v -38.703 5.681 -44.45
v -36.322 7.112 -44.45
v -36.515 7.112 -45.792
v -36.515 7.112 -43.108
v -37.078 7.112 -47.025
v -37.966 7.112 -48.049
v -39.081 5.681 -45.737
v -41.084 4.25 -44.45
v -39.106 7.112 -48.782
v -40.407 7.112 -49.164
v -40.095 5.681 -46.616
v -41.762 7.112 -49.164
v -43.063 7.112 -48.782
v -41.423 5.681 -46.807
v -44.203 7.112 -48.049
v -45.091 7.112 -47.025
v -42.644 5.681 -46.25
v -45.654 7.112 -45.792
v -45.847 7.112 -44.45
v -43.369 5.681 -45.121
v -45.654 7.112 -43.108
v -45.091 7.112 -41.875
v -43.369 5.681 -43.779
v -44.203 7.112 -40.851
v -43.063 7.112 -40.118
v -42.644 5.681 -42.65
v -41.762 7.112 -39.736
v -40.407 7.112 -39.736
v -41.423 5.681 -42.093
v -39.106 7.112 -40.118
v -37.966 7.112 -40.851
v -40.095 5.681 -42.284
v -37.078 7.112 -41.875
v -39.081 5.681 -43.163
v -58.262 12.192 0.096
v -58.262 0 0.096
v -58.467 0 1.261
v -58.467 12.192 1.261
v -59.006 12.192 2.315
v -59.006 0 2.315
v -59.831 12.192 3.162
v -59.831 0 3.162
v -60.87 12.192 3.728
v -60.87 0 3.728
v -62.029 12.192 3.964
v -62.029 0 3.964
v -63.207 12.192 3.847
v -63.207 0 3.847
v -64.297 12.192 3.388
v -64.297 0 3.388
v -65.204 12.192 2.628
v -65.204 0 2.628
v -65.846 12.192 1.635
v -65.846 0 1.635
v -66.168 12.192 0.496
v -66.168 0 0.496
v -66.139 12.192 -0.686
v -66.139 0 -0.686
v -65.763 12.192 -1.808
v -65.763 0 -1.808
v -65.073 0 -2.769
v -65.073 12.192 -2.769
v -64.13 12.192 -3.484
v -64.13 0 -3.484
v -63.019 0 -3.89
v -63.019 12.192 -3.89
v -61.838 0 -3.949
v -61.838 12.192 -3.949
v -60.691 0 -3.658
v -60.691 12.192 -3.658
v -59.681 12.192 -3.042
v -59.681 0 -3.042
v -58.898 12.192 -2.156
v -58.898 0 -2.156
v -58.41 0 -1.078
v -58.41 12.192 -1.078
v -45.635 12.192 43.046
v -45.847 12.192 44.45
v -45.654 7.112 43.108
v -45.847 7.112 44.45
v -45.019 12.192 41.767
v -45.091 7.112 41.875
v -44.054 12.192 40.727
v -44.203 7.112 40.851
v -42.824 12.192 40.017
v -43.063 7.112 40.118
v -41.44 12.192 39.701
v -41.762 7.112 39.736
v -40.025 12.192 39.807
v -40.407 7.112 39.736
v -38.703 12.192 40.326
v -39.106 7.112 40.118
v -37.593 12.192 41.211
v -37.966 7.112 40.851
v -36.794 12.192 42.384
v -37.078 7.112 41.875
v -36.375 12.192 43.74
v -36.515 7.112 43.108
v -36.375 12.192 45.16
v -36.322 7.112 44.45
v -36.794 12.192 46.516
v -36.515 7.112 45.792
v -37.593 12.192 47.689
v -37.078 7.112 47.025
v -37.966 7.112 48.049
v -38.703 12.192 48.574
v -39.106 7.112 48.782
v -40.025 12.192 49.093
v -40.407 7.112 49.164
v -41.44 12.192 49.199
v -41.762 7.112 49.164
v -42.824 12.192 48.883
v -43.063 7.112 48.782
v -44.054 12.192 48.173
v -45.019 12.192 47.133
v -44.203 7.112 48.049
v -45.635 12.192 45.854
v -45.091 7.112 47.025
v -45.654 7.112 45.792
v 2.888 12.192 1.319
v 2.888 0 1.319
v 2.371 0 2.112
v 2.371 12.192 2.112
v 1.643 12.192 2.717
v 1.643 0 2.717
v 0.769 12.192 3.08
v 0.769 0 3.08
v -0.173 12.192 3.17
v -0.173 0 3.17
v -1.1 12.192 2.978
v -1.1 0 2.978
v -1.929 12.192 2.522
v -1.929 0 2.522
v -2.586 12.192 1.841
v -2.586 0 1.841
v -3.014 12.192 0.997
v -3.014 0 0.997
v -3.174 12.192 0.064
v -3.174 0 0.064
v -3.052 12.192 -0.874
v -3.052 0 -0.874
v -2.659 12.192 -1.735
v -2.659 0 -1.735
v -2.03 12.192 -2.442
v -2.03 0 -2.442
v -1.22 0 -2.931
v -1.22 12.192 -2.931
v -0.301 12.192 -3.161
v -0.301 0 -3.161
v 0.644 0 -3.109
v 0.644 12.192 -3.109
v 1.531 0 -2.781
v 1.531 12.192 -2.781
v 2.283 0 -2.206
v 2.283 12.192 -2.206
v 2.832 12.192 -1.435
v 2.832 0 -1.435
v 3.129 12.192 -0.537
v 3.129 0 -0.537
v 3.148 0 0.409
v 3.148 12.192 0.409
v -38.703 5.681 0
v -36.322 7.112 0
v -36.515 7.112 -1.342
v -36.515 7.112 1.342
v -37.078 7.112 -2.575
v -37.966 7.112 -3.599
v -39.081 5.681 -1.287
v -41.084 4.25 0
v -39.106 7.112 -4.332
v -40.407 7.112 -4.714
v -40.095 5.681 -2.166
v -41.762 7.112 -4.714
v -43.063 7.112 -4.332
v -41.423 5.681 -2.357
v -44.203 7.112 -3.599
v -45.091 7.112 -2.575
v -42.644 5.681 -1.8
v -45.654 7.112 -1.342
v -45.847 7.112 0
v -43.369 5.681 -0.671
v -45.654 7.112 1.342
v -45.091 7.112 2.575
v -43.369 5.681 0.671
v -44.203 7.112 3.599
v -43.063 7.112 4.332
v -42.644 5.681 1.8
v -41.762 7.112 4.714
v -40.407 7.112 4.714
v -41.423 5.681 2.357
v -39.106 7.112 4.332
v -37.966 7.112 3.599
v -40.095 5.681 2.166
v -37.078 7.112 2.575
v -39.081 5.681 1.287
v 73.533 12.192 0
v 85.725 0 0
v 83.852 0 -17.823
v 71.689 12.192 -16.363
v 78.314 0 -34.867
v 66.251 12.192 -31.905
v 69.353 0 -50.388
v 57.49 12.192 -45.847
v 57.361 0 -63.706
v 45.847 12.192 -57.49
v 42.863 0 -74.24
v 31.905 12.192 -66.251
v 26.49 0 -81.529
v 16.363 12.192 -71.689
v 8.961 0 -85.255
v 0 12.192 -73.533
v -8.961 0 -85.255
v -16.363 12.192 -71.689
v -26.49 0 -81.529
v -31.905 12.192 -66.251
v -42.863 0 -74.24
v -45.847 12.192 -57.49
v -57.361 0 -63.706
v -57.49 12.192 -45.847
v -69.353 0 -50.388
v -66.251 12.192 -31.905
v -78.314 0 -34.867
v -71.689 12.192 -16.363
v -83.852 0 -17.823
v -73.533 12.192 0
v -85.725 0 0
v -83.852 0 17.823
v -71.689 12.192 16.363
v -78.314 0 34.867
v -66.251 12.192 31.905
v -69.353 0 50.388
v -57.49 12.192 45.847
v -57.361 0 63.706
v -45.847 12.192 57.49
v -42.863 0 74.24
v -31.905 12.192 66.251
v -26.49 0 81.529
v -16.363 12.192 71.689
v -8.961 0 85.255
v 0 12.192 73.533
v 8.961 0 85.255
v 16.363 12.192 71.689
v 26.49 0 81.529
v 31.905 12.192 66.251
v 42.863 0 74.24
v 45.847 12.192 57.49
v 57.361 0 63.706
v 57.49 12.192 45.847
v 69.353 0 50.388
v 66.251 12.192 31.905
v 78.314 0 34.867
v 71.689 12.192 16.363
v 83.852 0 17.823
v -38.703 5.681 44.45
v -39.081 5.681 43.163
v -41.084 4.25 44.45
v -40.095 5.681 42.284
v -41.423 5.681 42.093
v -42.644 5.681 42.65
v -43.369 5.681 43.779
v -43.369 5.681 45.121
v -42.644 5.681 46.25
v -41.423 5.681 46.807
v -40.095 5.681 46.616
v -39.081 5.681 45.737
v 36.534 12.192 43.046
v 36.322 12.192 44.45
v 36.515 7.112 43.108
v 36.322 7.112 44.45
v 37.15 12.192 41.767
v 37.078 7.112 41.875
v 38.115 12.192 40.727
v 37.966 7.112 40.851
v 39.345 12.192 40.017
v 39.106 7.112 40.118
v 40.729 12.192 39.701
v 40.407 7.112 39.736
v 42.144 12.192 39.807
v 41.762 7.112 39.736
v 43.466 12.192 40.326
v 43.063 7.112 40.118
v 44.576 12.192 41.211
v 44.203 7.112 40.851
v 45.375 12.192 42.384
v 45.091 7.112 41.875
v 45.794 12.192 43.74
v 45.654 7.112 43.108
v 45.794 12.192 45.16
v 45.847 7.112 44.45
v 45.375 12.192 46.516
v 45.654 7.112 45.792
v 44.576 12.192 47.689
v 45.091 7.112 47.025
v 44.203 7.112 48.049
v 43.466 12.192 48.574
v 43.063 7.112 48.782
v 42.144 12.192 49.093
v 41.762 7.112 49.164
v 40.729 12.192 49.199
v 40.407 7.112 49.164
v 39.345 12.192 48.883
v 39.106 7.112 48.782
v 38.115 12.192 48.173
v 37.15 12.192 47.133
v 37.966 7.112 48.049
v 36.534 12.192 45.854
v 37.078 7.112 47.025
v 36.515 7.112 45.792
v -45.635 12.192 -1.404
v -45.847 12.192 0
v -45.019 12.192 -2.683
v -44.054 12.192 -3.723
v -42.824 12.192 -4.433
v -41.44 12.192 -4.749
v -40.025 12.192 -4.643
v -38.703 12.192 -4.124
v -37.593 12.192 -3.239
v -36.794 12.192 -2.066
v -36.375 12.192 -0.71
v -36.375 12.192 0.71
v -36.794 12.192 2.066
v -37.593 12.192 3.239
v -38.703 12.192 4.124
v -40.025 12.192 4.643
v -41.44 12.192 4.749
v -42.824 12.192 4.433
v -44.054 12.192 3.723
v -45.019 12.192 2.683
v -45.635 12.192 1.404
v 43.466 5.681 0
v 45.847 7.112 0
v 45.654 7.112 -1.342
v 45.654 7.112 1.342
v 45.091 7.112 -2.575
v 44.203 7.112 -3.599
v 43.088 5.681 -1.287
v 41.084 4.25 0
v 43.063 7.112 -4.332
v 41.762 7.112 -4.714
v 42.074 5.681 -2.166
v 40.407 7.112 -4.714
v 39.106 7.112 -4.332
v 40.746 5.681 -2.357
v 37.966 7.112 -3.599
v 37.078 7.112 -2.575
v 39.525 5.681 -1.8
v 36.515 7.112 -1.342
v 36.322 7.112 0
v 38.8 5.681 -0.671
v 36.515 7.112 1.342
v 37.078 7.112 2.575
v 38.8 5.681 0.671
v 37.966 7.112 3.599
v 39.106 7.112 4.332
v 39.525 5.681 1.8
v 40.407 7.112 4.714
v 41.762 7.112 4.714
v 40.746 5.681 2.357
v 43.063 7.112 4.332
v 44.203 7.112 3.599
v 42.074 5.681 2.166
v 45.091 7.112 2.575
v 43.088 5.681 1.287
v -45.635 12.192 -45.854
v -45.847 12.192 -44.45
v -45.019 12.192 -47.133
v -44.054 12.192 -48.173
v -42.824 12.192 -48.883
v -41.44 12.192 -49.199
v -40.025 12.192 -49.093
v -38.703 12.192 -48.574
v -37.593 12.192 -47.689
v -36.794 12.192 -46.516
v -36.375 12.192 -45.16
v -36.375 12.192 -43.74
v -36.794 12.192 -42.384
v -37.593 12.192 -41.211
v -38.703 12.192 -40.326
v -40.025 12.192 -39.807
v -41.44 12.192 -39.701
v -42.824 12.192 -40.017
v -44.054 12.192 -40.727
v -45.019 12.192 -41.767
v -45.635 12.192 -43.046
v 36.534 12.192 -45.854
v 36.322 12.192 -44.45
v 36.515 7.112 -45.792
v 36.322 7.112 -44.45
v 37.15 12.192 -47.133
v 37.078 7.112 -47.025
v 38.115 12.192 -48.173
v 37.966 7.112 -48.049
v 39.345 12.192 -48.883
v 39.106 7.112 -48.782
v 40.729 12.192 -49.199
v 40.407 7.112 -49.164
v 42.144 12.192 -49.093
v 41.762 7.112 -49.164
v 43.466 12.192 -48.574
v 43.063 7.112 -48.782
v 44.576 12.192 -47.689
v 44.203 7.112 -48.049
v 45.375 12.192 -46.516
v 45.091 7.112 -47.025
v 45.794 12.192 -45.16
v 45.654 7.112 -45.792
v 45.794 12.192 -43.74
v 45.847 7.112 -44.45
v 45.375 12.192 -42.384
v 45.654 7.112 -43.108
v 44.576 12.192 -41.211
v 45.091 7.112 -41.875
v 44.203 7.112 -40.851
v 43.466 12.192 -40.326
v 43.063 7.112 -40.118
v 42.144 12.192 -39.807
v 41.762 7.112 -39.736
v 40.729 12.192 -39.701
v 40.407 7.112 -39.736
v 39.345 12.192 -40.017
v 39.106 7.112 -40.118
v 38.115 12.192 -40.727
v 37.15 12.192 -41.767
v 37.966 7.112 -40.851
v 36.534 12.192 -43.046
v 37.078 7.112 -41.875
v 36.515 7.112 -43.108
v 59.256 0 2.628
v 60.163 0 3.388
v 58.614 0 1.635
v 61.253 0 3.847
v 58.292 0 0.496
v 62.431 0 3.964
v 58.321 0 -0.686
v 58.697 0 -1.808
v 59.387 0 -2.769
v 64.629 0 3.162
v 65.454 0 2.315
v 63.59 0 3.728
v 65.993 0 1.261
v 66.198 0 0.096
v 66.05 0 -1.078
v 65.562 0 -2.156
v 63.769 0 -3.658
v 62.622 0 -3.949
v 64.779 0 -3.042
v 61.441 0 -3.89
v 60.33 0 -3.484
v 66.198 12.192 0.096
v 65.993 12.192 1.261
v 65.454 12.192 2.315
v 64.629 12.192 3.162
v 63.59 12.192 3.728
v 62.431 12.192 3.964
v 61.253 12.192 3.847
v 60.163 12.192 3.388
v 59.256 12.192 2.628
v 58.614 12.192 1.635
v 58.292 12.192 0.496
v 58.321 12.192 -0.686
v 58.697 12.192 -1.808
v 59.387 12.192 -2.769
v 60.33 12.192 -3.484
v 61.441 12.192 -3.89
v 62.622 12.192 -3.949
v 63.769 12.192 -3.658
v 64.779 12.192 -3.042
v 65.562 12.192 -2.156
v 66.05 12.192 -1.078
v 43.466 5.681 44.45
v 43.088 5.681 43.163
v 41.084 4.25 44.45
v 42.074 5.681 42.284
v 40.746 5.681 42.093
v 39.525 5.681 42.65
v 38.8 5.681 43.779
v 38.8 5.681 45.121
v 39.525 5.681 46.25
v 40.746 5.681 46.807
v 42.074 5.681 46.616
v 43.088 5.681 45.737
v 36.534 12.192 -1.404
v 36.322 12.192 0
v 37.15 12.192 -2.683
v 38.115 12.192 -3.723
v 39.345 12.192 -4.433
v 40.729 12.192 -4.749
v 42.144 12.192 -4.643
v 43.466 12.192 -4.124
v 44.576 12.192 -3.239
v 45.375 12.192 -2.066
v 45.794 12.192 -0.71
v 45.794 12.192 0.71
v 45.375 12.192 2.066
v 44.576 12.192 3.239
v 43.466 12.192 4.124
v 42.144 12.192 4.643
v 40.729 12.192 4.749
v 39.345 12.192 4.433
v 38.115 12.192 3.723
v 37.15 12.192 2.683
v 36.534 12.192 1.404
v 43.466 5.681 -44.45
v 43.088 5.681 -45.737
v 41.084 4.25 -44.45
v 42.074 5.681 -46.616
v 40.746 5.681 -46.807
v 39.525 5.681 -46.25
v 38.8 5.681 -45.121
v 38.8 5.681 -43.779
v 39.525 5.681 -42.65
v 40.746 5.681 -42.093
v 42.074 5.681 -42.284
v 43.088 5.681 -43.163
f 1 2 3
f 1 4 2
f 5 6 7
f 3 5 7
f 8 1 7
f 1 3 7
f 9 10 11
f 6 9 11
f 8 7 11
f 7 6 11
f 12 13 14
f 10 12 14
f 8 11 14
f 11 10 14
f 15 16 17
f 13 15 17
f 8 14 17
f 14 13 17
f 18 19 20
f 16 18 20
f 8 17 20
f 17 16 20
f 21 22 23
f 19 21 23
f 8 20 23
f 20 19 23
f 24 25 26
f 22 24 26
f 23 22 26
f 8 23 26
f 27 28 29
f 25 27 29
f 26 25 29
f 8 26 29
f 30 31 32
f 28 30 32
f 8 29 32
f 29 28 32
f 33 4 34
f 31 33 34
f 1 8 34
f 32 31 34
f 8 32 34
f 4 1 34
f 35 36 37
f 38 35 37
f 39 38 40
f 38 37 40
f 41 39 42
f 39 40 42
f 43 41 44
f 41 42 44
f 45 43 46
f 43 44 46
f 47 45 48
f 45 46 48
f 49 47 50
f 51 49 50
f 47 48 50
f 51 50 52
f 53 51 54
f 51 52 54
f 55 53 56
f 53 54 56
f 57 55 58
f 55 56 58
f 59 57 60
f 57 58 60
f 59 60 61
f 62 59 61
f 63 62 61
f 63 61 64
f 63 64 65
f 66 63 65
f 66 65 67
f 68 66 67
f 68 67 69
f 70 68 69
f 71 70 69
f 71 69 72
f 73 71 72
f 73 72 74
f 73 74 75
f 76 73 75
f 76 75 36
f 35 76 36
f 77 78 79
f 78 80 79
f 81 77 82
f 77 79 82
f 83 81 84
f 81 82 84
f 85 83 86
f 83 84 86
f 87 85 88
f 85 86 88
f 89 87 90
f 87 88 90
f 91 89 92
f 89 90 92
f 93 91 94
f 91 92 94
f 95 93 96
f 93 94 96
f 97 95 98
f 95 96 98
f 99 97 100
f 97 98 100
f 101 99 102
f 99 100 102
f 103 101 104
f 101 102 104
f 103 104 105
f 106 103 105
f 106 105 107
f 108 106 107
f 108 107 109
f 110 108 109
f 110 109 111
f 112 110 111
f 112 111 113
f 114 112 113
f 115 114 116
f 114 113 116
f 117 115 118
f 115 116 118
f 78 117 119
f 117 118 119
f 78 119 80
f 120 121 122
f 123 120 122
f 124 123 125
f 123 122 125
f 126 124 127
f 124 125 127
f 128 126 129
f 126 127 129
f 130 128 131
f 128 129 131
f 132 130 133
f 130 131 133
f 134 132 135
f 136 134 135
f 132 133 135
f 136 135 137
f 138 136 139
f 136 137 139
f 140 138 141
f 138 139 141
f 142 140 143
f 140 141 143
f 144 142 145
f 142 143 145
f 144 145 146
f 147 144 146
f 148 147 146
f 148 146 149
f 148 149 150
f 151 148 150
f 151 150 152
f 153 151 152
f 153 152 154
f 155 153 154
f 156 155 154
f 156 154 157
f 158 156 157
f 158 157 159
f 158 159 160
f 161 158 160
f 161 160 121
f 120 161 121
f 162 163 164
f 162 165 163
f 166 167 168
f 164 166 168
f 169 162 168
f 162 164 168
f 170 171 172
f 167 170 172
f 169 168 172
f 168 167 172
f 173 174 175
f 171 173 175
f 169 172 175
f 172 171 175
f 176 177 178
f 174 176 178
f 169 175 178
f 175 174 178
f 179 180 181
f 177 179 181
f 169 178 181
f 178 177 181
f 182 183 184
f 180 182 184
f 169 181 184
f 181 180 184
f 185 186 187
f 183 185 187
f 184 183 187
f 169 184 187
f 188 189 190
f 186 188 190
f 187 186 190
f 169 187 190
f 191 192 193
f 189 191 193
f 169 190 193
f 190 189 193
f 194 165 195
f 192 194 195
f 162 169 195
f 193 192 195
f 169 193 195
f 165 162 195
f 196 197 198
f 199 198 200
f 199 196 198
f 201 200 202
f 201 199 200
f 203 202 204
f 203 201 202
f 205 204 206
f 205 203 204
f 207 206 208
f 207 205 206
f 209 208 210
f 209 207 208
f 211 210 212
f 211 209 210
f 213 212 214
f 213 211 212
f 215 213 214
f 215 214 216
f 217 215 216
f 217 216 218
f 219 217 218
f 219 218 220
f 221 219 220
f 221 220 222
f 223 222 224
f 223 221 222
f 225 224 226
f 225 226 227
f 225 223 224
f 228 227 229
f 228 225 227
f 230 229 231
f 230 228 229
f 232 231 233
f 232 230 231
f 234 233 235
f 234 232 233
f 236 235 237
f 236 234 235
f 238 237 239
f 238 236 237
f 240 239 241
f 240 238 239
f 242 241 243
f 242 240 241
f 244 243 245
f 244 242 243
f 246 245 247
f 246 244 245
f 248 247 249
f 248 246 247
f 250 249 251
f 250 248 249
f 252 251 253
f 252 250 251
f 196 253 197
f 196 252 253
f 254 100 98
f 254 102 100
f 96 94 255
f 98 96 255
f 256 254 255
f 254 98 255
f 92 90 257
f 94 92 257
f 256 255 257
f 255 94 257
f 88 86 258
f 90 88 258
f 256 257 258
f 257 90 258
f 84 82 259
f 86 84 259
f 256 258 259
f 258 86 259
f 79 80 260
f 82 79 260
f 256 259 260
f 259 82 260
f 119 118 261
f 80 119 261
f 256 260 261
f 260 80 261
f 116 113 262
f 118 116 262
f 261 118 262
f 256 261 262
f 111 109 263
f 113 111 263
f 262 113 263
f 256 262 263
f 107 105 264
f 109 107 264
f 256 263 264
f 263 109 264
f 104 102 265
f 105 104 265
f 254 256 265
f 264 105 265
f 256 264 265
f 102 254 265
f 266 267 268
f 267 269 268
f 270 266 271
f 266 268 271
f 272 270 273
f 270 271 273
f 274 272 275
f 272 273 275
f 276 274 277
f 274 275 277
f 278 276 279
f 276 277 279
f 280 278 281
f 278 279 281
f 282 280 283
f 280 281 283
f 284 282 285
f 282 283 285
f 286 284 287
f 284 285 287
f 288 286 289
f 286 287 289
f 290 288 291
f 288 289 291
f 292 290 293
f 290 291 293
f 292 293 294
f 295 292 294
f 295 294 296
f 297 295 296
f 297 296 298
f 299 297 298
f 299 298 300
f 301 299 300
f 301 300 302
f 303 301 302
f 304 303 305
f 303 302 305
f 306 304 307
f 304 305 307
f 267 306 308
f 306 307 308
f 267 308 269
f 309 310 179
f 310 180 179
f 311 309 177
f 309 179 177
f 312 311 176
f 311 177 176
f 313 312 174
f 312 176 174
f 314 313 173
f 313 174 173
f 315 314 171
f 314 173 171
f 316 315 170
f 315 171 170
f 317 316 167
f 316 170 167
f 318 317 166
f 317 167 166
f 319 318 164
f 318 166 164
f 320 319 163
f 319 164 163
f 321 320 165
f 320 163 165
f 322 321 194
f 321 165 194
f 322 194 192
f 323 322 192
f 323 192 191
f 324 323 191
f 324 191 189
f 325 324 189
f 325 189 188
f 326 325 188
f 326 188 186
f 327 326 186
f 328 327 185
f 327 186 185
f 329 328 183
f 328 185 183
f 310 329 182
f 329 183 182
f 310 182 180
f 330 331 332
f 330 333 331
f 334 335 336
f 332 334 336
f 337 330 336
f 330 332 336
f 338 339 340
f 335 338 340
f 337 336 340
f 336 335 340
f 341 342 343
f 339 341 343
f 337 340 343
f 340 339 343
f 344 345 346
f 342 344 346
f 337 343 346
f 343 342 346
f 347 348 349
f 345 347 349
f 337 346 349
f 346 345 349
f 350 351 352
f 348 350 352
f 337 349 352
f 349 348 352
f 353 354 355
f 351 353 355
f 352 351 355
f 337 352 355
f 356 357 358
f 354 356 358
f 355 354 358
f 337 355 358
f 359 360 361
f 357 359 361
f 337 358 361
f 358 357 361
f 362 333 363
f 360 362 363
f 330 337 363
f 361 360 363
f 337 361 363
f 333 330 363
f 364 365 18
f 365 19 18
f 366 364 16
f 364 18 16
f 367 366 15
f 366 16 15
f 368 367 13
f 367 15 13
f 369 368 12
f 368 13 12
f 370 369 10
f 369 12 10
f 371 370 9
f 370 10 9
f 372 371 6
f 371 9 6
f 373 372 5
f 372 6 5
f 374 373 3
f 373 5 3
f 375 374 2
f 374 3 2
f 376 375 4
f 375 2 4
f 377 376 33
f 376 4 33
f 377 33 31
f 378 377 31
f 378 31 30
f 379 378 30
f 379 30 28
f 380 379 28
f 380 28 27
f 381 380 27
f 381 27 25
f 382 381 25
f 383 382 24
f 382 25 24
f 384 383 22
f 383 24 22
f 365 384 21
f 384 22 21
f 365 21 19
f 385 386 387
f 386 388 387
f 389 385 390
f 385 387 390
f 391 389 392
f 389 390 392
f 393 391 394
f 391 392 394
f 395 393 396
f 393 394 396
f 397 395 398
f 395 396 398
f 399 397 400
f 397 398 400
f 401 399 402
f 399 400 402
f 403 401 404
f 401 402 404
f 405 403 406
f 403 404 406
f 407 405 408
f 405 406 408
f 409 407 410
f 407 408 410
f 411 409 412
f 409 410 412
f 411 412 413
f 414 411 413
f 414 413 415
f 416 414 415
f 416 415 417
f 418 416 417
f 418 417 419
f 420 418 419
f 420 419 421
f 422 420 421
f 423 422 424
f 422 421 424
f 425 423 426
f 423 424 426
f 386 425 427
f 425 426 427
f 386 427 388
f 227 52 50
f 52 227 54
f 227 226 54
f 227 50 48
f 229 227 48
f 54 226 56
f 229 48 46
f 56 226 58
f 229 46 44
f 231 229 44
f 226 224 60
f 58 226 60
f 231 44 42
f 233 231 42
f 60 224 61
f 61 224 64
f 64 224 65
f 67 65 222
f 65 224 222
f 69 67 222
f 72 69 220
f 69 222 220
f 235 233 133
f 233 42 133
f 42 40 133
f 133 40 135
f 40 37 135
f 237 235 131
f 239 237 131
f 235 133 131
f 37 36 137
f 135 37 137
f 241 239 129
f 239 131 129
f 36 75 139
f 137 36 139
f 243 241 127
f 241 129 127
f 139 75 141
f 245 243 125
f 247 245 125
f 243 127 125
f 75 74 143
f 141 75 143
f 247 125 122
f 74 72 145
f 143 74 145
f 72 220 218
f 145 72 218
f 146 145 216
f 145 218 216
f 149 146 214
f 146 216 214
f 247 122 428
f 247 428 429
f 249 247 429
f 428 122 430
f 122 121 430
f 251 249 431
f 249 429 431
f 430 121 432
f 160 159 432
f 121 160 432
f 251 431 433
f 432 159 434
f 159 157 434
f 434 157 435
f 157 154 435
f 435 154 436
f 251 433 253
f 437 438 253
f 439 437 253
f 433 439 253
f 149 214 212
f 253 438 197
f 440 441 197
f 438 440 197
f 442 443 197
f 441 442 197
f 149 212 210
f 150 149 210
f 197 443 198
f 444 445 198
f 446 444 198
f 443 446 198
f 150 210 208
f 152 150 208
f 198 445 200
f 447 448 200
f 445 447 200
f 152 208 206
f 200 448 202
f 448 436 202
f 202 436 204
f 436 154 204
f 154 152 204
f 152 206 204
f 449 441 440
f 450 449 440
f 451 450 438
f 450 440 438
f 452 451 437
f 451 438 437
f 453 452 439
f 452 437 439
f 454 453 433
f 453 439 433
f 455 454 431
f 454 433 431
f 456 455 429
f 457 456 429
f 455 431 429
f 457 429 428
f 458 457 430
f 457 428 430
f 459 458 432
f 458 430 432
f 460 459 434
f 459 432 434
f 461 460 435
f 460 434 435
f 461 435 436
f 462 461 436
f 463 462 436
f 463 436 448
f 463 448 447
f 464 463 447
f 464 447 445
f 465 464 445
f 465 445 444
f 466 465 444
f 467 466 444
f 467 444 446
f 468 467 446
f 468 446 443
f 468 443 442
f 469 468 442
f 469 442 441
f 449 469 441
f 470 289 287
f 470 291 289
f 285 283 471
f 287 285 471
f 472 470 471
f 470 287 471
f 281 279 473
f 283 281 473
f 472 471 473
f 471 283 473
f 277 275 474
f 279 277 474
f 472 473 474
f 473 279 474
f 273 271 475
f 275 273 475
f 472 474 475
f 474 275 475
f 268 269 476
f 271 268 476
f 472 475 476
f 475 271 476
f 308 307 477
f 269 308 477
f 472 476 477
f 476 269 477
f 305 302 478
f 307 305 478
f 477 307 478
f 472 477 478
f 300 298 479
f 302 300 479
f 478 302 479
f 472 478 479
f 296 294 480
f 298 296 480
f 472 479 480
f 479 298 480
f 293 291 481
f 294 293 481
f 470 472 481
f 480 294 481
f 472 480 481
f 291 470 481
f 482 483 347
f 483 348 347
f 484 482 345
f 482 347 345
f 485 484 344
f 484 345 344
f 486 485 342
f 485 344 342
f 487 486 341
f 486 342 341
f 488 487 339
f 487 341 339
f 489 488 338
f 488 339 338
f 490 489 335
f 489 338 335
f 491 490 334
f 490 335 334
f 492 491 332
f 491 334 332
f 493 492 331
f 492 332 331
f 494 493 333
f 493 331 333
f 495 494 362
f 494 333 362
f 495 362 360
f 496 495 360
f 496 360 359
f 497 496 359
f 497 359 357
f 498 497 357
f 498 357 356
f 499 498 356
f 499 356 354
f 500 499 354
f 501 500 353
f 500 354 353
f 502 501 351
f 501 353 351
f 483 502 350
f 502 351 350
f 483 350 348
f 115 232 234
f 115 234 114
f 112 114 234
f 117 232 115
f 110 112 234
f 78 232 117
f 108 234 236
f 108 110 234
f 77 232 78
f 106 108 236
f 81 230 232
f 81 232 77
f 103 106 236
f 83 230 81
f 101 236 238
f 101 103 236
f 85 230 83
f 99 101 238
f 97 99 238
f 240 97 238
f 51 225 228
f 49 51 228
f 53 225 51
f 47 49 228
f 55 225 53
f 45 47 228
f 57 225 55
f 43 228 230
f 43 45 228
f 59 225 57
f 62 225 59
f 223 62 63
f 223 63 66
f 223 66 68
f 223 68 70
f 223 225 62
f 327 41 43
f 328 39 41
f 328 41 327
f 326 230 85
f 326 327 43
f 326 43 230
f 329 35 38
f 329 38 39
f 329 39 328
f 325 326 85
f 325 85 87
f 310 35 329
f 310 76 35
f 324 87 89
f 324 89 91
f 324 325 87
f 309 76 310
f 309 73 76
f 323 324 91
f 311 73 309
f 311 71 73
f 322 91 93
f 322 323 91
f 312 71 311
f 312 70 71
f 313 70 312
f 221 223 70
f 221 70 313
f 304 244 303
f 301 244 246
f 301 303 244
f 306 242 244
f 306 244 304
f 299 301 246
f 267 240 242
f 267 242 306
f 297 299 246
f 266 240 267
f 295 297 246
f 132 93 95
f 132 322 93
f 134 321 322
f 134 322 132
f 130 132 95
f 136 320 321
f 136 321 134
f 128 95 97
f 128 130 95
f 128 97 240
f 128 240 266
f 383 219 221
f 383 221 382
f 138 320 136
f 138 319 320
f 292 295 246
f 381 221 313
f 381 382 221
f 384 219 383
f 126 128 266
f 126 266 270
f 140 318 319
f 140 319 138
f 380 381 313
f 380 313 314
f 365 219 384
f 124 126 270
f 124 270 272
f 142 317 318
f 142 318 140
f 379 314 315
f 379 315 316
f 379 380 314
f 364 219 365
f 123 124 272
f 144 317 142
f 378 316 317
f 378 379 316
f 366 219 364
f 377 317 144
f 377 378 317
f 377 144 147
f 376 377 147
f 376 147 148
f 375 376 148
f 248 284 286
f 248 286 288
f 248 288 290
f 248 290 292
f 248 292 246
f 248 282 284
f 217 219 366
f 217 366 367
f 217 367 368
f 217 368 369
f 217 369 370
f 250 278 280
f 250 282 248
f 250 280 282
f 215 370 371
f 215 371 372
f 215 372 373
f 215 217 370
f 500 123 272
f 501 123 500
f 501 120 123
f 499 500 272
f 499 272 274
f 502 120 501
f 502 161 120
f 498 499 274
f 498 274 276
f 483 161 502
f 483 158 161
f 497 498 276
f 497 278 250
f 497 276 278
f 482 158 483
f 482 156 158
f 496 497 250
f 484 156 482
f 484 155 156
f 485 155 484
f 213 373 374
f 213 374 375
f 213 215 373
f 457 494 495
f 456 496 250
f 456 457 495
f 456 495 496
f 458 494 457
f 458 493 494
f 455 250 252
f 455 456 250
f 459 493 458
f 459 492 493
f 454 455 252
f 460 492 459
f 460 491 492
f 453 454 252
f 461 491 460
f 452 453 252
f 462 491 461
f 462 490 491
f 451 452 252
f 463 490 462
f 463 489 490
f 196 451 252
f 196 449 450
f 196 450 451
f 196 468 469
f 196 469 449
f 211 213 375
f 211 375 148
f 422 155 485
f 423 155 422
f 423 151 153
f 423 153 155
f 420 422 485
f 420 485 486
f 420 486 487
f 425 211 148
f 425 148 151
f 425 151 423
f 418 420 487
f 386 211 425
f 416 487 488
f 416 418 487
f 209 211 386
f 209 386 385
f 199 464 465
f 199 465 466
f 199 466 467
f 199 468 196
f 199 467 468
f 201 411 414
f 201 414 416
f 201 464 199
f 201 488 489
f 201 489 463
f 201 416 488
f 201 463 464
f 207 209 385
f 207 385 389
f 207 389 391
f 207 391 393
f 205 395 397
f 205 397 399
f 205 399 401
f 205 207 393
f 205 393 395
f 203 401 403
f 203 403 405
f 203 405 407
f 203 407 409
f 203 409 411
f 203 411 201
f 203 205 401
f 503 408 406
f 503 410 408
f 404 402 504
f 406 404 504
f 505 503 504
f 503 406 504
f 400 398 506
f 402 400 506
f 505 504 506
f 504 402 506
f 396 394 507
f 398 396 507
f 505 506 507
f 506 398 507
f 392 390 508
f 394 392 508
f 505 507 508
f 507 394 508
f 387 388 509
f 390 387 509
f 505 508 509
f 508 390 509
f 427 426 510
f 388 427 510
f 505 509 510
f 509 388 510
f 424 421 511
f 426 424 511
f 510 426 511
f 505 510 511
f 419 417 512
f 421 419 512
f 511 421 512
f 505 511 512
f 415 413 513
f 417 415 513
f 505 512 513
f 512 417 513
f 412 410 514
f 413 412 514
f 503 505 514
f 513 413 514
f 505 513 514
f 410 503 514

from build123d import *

# Parameters (mm, degrees)
SKETCH1_R                        = 85.725
BOSS_EXTRUDE1_DEPTH              = 12.192
BOSS_EXTRUDE1_TAPER              = 45
F_3_8_16_TAPPED_HOLE1_D          = 7.9375
F_1_4_0_25_PRESS_DOWEL_HOLE1_D   = 6.35
F_3_8_0_375_DIAMETER_HOLE1_D     = 9.525
F_3_8_0_375_DIAMETER_HOLE1_DEPTH = 5.08
F_3_8_0_375_DIAMETER_HOLE1_TIP   = 2.861598698


with BuildPart() as part:
    # Sketch1 → Boss-Extrude1 (new body)
    with BuildSketch(Plane(origin=(0, 0, 0), x_dir=(1, 0, 0), z_dir=(0, 1, 0))):
        Circle(SKETCH1_R)
    extrude(amount=BOSS_EXTRUDE1_DEPTH, taper=BOSS_EXTRUDE1_TAPER)

    # 3/8-16 Tapped Hole1 (through all)
    with Locations(Plane(origin=(0, 12.192, 0), x_dir=(-0.9997060077974085, 0, -0.024246607469250836), z_dir=(0, 1, 0))):
        with Locations((62.211704865, 1.508866383), (-62.211704865, -1.508866383)):
            Hole(F_3_8_16_TAPPED_HOLE1_D / 2)

    # 1/4 (0.25) Press Dowel Hole1 (through all)
    with Locations(Plane(origin=(-177.991498203, 12.192, 193.466008664), x_dir=(-0.909586317376337, 0, -0.4155150192733753), z_dir=(0, 1, 0))):
        with Locations((-81.510599056, -249.932175164)):
            Hole(F_1_4_0_25_PRESS_DOWEL_HOLE1_D / 2)

    # 3/8 (0.375) Diameter Hole1
    with Locations(Plane(origin=(0, 12.192, 0), x_dir=(1, 0, 0), z_dir=(0, 1, 0))):
        with Locations((-41.0845, 44.45), (-41.0845, 0), (-41.0845, -44.45), (41.0845, -44.45), (41.0845, 0), (41.0845, 44.45)):
            Hole(F_3_8_0_375_DIAMETER_HOLE1_D / 2, depth=F_3_8_0_375_DIAMETER_HOLE1_DEPTH)
            with Locations((0, 0, -(F_3_8_0_375_DIAMETER_HOLE1_DEPTH + F_3_8_0_375_DIAMETER_HOLE1_TIP / 2))):  # 118° drill point
                Cone(0, F_3_8_0_375_DIAMETER_HOLE1_D / 2, F_3_8_0_375_DIAMETER_HOLE1_TIP, mode=Mode.SUBTRACT)


solid = part.part
